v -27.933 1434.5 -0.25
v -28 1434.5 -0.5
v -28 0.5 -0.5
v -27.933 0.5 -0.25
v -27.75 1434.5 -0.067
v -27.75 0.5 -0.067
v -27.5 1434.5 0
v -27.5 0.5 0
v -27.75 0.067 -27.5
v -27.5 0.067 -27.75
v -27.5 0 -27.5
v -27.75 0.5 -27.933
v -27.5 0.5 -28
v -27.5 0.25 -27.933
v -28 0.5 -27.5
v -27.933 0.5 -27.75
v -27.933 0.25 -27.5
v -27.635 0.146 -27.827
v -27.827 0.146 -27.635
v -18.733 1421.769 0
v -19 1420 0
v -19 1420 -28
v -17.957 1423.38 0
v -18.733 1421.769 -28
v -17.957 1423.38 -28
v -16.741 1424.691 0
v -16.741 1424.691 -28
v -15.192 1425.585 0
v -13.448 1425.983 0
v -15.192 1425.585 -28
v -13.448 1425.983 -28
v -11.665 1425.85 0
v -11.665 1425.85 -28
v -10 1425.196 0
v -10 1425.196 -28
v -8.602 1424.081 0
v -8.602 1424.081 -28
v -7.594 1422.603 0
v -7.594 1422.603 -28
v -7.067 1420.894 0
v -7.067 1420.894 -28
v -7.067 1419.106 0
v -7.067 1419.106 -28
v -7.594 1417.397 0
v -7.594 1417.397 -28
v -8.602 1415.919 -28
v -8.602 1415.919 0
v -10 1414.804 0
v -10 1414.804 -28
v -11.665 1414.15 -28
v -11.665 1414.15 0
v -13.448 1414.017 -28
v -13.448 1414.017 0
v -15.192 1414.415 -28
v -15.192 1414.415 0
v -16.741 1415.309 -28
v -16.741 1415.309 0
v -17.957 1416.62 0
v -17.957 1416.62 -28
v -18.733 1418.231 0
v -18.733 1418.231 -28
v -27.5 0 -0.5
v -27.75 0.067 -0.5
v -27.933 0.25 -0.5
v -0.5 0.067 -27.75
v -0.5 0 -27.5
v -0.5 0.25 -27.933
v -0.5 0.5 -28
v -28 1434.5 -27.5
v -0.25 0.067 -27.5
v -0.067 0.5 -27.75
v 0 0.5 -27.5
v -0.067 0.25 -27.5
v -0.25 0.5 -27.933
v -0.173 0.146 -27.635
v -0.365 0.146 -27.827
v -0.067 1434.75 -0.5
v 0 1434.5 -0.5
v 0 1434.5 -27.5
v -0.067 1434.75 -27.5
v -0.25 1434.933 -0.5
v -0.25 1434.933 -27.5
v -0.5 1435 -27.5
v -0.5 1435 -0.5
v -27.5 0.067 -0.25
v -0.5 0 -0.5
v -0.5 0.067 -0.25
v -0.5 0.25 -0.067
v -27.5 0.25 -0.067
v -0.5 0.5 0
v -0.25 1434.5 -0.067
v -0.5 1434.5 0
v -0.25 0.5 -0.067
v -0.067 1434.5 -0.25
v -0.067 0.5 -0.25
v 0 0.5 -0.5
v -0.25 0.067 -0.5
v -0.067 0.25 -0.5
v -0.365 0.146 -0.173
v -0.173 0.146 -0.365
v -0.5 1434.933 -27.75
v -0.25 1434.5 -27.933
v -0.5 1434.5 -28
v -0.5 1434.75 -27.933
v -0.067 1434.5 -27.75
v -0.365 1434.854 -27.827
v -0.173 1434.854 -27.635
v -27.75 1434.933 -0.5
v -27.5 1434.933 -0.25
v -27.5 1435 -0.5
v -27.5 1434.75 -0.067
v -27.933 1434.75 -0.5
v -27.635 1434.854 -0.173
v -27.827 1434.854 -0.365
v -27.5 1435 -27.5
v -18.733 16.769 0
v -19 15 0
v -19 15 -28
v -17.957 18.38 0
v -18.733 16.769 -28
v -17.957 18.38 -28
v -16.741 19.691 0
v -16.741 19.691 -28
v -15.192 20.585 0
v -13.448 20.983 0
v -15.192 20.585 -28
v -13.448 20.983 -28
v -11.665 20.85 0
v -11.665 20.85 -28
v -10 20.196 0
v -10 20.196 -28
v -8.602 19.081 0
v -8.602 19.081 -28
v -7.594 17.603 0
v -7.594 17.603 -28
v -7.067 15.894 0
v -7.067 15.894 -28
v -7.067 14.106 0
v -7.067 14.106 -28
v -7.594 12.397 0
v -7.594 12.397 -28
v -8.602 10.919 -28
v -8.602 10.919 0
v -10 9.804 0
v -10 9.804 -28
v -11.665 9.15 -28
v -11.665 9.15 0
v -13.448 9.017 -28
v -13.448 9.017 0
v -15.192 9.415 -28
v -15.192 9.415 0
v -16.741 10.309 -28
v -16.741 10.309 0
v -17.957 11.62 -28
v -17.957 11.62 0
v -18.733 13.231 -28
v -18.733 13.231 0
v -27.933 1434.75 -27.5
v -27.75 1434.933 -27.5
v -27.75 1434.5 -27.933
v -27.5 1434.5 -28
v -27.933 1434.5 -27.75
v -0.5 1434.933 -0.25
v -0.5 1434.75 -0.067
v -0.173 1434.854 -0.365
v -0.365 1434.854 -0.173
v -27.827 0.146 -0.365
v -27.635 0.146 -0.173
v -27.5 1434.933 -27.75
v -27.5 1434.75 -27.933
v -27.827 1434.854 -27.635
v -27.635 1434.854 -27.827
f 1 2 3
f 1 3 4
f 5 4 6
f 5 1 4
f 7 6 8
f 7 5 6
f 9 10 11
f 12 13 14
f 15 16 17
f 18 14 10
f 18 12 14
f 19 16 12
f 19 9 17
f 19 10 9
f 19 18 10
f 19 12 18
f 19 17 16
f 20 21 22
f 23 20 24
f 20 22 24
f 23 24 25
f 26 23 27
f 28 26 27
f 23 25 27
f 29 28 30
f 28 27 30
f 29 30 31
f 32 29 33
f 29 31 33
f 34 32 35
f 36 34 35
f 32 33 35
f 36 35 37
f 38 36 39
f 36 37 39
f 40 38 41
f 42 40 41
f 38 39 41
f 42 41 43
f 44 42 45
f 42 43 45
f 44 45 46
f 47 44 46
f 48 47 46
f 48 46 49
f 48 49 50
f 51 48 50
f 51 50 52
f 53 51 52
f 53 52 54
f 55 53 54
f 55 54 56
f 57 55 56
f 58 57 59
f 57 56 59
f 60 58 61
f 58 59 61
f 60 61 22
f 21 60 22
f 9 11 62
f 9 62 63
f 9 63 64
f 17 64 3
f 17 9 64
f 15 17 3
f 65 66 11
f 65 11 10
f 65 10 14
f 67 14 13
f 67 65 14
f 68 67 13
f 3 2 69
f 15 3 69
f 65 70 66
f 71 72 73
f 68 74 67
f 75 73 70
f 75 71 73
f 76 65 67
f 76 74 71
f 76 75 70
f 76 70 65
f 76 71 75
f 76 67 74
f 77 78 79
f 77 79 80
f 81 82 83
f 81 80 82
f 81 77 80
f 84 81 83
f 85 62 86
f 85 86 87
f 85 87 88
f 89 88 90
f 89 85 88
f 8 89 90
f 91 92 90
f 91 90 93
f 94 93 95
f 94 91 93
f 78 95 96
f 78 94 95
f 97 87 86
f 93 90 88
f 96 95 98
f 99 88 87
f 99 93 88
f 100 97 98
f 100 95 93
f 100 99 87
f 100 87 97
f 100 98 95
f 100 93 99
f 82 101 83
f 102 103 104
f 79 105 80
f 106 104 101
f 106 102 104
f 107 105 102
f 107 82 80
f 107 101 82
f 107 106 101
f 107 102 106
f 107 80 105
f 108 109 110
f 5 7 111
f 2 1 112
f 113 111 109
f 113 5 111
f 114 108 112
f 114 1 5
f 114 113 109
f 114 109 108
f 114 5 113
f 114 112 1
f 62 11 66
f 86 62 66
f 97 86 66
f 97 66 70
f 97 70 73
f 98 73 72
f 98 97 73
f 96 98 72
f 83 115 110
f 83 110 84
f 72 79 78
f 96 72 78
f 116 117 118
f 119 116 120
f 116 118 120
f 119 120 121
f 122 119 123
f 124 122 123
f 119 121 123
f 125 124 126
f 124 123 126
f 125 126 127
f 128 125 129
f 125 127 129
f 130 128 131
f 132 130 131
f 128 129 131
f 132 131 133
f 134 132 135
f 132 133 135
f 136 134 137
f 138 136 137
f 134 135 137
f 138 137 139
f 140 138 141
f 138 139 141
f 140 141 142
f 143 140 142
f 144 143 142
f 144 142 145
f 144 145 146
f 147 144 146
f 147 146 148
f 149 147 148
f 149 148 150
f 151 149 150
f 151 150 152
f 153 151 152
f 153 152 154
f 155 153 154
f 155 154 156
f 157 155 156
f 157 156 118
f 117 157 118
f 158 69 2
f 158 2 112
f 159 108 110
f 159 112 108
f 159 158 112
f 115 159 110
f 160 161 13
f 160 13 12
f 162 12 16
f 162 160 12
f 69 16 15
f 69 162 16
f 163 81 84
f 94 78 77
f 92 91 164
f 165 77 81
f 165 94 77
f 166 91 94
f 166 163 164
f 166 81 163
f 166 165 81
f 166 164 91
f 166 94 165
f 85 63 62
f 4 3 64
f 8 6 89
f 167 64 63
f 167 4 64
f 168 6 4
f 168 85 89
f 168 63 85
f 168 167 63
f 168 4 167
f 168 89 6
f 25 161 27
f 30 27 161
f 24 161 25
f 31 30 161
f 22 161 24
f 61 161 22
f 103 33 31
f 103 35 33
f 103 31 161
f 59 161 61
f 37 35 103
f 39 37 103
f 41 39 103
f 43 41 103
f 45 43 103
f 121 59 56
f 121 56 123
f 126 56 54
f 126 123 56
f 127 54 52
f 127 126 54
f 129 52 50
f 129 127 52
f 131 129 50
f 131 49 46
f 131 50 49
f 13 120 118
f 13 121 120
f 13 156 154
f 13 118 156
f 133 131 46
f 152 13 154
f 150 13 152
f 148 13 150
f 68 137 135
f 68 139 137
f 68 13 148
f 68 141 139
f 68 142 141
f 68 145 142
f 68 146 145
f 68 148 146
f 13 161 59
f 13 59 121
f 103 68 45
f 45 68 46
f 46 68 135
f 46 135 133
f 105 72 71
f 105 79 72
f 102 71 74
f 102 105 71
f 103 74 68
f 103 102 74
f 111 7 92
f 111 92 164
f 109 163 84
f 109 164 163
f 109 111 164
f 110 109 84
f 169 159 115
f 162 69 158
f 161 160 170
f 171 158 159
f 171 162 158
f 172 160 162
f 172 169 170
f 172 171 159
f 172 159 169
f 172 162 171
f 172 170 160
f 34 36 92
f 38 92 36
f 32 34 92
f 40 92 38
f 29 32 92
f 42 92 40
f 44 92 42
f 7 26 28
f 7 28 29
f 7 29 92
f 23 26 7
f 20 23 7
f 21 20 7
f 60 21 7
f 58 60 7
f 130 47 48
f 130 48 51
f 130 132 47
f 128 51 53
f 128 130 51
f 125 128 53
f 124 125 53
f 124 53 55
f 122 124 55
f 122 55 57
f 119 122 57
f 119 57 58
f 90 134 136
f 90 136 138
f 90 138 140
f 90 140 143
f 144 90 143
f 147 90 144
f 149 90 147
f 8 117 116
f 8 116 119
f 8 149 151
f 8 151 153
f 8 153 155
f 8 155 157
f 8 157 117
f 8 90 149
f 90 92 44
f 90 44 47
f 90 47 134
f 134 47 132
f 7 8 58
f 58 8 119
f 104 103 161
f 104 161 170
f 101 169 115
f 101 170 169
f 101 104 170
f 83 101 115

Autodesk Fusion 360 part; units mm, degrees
sketch "Sketch2" plane through (0, 0, 0) normal (0, 1, 0) x (1, 0, 0)
  line L0 (0, 0) -> (-28, 0)
  line L1 (-28, 0) -> (-28, 28)
  line L2 (-28, 28) -> (0, 28)
  line L3 (0, 28) -> (0, 0)
  dimension "d1" = 28
  dimension "d2" = 28
extrude "Extrude1" add sketch "Sketch2" along normal blind 1435
sketch "Sketch3" plane through (0, 0, -28) normal (0, 0, -1) x (-1, 0, 0)
  line L0 (0, 0) -> (28, 0)
  line L1 (28, 0) -> (28, 1435)
  line L2 (28, 1435) -> (0, 1435)
  line L3 (0, 1435) -> (0, 0)
  circle A0 centre (13, 1420) radius 6
  line L4 (28, 717.5) -> (0, 717.5) construction
  circle A1 centre (13, 15) radius 6
  dimension "d5" = 12
  dimension "d6" = 15
  dimension "d7" = 15
extrude "Extrude2" cut sketch "Sketch3" against normal through all contours A0 | A1
fillet "Fillet1" radius 0.5 12 edges at (-28, 717.5, 0) (0, 717.5, 0) (-28, 717.5, -28) (0, 717.5, -28) (0, 1435, -14) (-14, 1435, -28) (-28, 1435, -14) (-14, 1435, 0) (-14, 0, 0) (-28, 0, -14) (0, 0, -14) (-14, 0, -28)
equation "d7 = d6"
